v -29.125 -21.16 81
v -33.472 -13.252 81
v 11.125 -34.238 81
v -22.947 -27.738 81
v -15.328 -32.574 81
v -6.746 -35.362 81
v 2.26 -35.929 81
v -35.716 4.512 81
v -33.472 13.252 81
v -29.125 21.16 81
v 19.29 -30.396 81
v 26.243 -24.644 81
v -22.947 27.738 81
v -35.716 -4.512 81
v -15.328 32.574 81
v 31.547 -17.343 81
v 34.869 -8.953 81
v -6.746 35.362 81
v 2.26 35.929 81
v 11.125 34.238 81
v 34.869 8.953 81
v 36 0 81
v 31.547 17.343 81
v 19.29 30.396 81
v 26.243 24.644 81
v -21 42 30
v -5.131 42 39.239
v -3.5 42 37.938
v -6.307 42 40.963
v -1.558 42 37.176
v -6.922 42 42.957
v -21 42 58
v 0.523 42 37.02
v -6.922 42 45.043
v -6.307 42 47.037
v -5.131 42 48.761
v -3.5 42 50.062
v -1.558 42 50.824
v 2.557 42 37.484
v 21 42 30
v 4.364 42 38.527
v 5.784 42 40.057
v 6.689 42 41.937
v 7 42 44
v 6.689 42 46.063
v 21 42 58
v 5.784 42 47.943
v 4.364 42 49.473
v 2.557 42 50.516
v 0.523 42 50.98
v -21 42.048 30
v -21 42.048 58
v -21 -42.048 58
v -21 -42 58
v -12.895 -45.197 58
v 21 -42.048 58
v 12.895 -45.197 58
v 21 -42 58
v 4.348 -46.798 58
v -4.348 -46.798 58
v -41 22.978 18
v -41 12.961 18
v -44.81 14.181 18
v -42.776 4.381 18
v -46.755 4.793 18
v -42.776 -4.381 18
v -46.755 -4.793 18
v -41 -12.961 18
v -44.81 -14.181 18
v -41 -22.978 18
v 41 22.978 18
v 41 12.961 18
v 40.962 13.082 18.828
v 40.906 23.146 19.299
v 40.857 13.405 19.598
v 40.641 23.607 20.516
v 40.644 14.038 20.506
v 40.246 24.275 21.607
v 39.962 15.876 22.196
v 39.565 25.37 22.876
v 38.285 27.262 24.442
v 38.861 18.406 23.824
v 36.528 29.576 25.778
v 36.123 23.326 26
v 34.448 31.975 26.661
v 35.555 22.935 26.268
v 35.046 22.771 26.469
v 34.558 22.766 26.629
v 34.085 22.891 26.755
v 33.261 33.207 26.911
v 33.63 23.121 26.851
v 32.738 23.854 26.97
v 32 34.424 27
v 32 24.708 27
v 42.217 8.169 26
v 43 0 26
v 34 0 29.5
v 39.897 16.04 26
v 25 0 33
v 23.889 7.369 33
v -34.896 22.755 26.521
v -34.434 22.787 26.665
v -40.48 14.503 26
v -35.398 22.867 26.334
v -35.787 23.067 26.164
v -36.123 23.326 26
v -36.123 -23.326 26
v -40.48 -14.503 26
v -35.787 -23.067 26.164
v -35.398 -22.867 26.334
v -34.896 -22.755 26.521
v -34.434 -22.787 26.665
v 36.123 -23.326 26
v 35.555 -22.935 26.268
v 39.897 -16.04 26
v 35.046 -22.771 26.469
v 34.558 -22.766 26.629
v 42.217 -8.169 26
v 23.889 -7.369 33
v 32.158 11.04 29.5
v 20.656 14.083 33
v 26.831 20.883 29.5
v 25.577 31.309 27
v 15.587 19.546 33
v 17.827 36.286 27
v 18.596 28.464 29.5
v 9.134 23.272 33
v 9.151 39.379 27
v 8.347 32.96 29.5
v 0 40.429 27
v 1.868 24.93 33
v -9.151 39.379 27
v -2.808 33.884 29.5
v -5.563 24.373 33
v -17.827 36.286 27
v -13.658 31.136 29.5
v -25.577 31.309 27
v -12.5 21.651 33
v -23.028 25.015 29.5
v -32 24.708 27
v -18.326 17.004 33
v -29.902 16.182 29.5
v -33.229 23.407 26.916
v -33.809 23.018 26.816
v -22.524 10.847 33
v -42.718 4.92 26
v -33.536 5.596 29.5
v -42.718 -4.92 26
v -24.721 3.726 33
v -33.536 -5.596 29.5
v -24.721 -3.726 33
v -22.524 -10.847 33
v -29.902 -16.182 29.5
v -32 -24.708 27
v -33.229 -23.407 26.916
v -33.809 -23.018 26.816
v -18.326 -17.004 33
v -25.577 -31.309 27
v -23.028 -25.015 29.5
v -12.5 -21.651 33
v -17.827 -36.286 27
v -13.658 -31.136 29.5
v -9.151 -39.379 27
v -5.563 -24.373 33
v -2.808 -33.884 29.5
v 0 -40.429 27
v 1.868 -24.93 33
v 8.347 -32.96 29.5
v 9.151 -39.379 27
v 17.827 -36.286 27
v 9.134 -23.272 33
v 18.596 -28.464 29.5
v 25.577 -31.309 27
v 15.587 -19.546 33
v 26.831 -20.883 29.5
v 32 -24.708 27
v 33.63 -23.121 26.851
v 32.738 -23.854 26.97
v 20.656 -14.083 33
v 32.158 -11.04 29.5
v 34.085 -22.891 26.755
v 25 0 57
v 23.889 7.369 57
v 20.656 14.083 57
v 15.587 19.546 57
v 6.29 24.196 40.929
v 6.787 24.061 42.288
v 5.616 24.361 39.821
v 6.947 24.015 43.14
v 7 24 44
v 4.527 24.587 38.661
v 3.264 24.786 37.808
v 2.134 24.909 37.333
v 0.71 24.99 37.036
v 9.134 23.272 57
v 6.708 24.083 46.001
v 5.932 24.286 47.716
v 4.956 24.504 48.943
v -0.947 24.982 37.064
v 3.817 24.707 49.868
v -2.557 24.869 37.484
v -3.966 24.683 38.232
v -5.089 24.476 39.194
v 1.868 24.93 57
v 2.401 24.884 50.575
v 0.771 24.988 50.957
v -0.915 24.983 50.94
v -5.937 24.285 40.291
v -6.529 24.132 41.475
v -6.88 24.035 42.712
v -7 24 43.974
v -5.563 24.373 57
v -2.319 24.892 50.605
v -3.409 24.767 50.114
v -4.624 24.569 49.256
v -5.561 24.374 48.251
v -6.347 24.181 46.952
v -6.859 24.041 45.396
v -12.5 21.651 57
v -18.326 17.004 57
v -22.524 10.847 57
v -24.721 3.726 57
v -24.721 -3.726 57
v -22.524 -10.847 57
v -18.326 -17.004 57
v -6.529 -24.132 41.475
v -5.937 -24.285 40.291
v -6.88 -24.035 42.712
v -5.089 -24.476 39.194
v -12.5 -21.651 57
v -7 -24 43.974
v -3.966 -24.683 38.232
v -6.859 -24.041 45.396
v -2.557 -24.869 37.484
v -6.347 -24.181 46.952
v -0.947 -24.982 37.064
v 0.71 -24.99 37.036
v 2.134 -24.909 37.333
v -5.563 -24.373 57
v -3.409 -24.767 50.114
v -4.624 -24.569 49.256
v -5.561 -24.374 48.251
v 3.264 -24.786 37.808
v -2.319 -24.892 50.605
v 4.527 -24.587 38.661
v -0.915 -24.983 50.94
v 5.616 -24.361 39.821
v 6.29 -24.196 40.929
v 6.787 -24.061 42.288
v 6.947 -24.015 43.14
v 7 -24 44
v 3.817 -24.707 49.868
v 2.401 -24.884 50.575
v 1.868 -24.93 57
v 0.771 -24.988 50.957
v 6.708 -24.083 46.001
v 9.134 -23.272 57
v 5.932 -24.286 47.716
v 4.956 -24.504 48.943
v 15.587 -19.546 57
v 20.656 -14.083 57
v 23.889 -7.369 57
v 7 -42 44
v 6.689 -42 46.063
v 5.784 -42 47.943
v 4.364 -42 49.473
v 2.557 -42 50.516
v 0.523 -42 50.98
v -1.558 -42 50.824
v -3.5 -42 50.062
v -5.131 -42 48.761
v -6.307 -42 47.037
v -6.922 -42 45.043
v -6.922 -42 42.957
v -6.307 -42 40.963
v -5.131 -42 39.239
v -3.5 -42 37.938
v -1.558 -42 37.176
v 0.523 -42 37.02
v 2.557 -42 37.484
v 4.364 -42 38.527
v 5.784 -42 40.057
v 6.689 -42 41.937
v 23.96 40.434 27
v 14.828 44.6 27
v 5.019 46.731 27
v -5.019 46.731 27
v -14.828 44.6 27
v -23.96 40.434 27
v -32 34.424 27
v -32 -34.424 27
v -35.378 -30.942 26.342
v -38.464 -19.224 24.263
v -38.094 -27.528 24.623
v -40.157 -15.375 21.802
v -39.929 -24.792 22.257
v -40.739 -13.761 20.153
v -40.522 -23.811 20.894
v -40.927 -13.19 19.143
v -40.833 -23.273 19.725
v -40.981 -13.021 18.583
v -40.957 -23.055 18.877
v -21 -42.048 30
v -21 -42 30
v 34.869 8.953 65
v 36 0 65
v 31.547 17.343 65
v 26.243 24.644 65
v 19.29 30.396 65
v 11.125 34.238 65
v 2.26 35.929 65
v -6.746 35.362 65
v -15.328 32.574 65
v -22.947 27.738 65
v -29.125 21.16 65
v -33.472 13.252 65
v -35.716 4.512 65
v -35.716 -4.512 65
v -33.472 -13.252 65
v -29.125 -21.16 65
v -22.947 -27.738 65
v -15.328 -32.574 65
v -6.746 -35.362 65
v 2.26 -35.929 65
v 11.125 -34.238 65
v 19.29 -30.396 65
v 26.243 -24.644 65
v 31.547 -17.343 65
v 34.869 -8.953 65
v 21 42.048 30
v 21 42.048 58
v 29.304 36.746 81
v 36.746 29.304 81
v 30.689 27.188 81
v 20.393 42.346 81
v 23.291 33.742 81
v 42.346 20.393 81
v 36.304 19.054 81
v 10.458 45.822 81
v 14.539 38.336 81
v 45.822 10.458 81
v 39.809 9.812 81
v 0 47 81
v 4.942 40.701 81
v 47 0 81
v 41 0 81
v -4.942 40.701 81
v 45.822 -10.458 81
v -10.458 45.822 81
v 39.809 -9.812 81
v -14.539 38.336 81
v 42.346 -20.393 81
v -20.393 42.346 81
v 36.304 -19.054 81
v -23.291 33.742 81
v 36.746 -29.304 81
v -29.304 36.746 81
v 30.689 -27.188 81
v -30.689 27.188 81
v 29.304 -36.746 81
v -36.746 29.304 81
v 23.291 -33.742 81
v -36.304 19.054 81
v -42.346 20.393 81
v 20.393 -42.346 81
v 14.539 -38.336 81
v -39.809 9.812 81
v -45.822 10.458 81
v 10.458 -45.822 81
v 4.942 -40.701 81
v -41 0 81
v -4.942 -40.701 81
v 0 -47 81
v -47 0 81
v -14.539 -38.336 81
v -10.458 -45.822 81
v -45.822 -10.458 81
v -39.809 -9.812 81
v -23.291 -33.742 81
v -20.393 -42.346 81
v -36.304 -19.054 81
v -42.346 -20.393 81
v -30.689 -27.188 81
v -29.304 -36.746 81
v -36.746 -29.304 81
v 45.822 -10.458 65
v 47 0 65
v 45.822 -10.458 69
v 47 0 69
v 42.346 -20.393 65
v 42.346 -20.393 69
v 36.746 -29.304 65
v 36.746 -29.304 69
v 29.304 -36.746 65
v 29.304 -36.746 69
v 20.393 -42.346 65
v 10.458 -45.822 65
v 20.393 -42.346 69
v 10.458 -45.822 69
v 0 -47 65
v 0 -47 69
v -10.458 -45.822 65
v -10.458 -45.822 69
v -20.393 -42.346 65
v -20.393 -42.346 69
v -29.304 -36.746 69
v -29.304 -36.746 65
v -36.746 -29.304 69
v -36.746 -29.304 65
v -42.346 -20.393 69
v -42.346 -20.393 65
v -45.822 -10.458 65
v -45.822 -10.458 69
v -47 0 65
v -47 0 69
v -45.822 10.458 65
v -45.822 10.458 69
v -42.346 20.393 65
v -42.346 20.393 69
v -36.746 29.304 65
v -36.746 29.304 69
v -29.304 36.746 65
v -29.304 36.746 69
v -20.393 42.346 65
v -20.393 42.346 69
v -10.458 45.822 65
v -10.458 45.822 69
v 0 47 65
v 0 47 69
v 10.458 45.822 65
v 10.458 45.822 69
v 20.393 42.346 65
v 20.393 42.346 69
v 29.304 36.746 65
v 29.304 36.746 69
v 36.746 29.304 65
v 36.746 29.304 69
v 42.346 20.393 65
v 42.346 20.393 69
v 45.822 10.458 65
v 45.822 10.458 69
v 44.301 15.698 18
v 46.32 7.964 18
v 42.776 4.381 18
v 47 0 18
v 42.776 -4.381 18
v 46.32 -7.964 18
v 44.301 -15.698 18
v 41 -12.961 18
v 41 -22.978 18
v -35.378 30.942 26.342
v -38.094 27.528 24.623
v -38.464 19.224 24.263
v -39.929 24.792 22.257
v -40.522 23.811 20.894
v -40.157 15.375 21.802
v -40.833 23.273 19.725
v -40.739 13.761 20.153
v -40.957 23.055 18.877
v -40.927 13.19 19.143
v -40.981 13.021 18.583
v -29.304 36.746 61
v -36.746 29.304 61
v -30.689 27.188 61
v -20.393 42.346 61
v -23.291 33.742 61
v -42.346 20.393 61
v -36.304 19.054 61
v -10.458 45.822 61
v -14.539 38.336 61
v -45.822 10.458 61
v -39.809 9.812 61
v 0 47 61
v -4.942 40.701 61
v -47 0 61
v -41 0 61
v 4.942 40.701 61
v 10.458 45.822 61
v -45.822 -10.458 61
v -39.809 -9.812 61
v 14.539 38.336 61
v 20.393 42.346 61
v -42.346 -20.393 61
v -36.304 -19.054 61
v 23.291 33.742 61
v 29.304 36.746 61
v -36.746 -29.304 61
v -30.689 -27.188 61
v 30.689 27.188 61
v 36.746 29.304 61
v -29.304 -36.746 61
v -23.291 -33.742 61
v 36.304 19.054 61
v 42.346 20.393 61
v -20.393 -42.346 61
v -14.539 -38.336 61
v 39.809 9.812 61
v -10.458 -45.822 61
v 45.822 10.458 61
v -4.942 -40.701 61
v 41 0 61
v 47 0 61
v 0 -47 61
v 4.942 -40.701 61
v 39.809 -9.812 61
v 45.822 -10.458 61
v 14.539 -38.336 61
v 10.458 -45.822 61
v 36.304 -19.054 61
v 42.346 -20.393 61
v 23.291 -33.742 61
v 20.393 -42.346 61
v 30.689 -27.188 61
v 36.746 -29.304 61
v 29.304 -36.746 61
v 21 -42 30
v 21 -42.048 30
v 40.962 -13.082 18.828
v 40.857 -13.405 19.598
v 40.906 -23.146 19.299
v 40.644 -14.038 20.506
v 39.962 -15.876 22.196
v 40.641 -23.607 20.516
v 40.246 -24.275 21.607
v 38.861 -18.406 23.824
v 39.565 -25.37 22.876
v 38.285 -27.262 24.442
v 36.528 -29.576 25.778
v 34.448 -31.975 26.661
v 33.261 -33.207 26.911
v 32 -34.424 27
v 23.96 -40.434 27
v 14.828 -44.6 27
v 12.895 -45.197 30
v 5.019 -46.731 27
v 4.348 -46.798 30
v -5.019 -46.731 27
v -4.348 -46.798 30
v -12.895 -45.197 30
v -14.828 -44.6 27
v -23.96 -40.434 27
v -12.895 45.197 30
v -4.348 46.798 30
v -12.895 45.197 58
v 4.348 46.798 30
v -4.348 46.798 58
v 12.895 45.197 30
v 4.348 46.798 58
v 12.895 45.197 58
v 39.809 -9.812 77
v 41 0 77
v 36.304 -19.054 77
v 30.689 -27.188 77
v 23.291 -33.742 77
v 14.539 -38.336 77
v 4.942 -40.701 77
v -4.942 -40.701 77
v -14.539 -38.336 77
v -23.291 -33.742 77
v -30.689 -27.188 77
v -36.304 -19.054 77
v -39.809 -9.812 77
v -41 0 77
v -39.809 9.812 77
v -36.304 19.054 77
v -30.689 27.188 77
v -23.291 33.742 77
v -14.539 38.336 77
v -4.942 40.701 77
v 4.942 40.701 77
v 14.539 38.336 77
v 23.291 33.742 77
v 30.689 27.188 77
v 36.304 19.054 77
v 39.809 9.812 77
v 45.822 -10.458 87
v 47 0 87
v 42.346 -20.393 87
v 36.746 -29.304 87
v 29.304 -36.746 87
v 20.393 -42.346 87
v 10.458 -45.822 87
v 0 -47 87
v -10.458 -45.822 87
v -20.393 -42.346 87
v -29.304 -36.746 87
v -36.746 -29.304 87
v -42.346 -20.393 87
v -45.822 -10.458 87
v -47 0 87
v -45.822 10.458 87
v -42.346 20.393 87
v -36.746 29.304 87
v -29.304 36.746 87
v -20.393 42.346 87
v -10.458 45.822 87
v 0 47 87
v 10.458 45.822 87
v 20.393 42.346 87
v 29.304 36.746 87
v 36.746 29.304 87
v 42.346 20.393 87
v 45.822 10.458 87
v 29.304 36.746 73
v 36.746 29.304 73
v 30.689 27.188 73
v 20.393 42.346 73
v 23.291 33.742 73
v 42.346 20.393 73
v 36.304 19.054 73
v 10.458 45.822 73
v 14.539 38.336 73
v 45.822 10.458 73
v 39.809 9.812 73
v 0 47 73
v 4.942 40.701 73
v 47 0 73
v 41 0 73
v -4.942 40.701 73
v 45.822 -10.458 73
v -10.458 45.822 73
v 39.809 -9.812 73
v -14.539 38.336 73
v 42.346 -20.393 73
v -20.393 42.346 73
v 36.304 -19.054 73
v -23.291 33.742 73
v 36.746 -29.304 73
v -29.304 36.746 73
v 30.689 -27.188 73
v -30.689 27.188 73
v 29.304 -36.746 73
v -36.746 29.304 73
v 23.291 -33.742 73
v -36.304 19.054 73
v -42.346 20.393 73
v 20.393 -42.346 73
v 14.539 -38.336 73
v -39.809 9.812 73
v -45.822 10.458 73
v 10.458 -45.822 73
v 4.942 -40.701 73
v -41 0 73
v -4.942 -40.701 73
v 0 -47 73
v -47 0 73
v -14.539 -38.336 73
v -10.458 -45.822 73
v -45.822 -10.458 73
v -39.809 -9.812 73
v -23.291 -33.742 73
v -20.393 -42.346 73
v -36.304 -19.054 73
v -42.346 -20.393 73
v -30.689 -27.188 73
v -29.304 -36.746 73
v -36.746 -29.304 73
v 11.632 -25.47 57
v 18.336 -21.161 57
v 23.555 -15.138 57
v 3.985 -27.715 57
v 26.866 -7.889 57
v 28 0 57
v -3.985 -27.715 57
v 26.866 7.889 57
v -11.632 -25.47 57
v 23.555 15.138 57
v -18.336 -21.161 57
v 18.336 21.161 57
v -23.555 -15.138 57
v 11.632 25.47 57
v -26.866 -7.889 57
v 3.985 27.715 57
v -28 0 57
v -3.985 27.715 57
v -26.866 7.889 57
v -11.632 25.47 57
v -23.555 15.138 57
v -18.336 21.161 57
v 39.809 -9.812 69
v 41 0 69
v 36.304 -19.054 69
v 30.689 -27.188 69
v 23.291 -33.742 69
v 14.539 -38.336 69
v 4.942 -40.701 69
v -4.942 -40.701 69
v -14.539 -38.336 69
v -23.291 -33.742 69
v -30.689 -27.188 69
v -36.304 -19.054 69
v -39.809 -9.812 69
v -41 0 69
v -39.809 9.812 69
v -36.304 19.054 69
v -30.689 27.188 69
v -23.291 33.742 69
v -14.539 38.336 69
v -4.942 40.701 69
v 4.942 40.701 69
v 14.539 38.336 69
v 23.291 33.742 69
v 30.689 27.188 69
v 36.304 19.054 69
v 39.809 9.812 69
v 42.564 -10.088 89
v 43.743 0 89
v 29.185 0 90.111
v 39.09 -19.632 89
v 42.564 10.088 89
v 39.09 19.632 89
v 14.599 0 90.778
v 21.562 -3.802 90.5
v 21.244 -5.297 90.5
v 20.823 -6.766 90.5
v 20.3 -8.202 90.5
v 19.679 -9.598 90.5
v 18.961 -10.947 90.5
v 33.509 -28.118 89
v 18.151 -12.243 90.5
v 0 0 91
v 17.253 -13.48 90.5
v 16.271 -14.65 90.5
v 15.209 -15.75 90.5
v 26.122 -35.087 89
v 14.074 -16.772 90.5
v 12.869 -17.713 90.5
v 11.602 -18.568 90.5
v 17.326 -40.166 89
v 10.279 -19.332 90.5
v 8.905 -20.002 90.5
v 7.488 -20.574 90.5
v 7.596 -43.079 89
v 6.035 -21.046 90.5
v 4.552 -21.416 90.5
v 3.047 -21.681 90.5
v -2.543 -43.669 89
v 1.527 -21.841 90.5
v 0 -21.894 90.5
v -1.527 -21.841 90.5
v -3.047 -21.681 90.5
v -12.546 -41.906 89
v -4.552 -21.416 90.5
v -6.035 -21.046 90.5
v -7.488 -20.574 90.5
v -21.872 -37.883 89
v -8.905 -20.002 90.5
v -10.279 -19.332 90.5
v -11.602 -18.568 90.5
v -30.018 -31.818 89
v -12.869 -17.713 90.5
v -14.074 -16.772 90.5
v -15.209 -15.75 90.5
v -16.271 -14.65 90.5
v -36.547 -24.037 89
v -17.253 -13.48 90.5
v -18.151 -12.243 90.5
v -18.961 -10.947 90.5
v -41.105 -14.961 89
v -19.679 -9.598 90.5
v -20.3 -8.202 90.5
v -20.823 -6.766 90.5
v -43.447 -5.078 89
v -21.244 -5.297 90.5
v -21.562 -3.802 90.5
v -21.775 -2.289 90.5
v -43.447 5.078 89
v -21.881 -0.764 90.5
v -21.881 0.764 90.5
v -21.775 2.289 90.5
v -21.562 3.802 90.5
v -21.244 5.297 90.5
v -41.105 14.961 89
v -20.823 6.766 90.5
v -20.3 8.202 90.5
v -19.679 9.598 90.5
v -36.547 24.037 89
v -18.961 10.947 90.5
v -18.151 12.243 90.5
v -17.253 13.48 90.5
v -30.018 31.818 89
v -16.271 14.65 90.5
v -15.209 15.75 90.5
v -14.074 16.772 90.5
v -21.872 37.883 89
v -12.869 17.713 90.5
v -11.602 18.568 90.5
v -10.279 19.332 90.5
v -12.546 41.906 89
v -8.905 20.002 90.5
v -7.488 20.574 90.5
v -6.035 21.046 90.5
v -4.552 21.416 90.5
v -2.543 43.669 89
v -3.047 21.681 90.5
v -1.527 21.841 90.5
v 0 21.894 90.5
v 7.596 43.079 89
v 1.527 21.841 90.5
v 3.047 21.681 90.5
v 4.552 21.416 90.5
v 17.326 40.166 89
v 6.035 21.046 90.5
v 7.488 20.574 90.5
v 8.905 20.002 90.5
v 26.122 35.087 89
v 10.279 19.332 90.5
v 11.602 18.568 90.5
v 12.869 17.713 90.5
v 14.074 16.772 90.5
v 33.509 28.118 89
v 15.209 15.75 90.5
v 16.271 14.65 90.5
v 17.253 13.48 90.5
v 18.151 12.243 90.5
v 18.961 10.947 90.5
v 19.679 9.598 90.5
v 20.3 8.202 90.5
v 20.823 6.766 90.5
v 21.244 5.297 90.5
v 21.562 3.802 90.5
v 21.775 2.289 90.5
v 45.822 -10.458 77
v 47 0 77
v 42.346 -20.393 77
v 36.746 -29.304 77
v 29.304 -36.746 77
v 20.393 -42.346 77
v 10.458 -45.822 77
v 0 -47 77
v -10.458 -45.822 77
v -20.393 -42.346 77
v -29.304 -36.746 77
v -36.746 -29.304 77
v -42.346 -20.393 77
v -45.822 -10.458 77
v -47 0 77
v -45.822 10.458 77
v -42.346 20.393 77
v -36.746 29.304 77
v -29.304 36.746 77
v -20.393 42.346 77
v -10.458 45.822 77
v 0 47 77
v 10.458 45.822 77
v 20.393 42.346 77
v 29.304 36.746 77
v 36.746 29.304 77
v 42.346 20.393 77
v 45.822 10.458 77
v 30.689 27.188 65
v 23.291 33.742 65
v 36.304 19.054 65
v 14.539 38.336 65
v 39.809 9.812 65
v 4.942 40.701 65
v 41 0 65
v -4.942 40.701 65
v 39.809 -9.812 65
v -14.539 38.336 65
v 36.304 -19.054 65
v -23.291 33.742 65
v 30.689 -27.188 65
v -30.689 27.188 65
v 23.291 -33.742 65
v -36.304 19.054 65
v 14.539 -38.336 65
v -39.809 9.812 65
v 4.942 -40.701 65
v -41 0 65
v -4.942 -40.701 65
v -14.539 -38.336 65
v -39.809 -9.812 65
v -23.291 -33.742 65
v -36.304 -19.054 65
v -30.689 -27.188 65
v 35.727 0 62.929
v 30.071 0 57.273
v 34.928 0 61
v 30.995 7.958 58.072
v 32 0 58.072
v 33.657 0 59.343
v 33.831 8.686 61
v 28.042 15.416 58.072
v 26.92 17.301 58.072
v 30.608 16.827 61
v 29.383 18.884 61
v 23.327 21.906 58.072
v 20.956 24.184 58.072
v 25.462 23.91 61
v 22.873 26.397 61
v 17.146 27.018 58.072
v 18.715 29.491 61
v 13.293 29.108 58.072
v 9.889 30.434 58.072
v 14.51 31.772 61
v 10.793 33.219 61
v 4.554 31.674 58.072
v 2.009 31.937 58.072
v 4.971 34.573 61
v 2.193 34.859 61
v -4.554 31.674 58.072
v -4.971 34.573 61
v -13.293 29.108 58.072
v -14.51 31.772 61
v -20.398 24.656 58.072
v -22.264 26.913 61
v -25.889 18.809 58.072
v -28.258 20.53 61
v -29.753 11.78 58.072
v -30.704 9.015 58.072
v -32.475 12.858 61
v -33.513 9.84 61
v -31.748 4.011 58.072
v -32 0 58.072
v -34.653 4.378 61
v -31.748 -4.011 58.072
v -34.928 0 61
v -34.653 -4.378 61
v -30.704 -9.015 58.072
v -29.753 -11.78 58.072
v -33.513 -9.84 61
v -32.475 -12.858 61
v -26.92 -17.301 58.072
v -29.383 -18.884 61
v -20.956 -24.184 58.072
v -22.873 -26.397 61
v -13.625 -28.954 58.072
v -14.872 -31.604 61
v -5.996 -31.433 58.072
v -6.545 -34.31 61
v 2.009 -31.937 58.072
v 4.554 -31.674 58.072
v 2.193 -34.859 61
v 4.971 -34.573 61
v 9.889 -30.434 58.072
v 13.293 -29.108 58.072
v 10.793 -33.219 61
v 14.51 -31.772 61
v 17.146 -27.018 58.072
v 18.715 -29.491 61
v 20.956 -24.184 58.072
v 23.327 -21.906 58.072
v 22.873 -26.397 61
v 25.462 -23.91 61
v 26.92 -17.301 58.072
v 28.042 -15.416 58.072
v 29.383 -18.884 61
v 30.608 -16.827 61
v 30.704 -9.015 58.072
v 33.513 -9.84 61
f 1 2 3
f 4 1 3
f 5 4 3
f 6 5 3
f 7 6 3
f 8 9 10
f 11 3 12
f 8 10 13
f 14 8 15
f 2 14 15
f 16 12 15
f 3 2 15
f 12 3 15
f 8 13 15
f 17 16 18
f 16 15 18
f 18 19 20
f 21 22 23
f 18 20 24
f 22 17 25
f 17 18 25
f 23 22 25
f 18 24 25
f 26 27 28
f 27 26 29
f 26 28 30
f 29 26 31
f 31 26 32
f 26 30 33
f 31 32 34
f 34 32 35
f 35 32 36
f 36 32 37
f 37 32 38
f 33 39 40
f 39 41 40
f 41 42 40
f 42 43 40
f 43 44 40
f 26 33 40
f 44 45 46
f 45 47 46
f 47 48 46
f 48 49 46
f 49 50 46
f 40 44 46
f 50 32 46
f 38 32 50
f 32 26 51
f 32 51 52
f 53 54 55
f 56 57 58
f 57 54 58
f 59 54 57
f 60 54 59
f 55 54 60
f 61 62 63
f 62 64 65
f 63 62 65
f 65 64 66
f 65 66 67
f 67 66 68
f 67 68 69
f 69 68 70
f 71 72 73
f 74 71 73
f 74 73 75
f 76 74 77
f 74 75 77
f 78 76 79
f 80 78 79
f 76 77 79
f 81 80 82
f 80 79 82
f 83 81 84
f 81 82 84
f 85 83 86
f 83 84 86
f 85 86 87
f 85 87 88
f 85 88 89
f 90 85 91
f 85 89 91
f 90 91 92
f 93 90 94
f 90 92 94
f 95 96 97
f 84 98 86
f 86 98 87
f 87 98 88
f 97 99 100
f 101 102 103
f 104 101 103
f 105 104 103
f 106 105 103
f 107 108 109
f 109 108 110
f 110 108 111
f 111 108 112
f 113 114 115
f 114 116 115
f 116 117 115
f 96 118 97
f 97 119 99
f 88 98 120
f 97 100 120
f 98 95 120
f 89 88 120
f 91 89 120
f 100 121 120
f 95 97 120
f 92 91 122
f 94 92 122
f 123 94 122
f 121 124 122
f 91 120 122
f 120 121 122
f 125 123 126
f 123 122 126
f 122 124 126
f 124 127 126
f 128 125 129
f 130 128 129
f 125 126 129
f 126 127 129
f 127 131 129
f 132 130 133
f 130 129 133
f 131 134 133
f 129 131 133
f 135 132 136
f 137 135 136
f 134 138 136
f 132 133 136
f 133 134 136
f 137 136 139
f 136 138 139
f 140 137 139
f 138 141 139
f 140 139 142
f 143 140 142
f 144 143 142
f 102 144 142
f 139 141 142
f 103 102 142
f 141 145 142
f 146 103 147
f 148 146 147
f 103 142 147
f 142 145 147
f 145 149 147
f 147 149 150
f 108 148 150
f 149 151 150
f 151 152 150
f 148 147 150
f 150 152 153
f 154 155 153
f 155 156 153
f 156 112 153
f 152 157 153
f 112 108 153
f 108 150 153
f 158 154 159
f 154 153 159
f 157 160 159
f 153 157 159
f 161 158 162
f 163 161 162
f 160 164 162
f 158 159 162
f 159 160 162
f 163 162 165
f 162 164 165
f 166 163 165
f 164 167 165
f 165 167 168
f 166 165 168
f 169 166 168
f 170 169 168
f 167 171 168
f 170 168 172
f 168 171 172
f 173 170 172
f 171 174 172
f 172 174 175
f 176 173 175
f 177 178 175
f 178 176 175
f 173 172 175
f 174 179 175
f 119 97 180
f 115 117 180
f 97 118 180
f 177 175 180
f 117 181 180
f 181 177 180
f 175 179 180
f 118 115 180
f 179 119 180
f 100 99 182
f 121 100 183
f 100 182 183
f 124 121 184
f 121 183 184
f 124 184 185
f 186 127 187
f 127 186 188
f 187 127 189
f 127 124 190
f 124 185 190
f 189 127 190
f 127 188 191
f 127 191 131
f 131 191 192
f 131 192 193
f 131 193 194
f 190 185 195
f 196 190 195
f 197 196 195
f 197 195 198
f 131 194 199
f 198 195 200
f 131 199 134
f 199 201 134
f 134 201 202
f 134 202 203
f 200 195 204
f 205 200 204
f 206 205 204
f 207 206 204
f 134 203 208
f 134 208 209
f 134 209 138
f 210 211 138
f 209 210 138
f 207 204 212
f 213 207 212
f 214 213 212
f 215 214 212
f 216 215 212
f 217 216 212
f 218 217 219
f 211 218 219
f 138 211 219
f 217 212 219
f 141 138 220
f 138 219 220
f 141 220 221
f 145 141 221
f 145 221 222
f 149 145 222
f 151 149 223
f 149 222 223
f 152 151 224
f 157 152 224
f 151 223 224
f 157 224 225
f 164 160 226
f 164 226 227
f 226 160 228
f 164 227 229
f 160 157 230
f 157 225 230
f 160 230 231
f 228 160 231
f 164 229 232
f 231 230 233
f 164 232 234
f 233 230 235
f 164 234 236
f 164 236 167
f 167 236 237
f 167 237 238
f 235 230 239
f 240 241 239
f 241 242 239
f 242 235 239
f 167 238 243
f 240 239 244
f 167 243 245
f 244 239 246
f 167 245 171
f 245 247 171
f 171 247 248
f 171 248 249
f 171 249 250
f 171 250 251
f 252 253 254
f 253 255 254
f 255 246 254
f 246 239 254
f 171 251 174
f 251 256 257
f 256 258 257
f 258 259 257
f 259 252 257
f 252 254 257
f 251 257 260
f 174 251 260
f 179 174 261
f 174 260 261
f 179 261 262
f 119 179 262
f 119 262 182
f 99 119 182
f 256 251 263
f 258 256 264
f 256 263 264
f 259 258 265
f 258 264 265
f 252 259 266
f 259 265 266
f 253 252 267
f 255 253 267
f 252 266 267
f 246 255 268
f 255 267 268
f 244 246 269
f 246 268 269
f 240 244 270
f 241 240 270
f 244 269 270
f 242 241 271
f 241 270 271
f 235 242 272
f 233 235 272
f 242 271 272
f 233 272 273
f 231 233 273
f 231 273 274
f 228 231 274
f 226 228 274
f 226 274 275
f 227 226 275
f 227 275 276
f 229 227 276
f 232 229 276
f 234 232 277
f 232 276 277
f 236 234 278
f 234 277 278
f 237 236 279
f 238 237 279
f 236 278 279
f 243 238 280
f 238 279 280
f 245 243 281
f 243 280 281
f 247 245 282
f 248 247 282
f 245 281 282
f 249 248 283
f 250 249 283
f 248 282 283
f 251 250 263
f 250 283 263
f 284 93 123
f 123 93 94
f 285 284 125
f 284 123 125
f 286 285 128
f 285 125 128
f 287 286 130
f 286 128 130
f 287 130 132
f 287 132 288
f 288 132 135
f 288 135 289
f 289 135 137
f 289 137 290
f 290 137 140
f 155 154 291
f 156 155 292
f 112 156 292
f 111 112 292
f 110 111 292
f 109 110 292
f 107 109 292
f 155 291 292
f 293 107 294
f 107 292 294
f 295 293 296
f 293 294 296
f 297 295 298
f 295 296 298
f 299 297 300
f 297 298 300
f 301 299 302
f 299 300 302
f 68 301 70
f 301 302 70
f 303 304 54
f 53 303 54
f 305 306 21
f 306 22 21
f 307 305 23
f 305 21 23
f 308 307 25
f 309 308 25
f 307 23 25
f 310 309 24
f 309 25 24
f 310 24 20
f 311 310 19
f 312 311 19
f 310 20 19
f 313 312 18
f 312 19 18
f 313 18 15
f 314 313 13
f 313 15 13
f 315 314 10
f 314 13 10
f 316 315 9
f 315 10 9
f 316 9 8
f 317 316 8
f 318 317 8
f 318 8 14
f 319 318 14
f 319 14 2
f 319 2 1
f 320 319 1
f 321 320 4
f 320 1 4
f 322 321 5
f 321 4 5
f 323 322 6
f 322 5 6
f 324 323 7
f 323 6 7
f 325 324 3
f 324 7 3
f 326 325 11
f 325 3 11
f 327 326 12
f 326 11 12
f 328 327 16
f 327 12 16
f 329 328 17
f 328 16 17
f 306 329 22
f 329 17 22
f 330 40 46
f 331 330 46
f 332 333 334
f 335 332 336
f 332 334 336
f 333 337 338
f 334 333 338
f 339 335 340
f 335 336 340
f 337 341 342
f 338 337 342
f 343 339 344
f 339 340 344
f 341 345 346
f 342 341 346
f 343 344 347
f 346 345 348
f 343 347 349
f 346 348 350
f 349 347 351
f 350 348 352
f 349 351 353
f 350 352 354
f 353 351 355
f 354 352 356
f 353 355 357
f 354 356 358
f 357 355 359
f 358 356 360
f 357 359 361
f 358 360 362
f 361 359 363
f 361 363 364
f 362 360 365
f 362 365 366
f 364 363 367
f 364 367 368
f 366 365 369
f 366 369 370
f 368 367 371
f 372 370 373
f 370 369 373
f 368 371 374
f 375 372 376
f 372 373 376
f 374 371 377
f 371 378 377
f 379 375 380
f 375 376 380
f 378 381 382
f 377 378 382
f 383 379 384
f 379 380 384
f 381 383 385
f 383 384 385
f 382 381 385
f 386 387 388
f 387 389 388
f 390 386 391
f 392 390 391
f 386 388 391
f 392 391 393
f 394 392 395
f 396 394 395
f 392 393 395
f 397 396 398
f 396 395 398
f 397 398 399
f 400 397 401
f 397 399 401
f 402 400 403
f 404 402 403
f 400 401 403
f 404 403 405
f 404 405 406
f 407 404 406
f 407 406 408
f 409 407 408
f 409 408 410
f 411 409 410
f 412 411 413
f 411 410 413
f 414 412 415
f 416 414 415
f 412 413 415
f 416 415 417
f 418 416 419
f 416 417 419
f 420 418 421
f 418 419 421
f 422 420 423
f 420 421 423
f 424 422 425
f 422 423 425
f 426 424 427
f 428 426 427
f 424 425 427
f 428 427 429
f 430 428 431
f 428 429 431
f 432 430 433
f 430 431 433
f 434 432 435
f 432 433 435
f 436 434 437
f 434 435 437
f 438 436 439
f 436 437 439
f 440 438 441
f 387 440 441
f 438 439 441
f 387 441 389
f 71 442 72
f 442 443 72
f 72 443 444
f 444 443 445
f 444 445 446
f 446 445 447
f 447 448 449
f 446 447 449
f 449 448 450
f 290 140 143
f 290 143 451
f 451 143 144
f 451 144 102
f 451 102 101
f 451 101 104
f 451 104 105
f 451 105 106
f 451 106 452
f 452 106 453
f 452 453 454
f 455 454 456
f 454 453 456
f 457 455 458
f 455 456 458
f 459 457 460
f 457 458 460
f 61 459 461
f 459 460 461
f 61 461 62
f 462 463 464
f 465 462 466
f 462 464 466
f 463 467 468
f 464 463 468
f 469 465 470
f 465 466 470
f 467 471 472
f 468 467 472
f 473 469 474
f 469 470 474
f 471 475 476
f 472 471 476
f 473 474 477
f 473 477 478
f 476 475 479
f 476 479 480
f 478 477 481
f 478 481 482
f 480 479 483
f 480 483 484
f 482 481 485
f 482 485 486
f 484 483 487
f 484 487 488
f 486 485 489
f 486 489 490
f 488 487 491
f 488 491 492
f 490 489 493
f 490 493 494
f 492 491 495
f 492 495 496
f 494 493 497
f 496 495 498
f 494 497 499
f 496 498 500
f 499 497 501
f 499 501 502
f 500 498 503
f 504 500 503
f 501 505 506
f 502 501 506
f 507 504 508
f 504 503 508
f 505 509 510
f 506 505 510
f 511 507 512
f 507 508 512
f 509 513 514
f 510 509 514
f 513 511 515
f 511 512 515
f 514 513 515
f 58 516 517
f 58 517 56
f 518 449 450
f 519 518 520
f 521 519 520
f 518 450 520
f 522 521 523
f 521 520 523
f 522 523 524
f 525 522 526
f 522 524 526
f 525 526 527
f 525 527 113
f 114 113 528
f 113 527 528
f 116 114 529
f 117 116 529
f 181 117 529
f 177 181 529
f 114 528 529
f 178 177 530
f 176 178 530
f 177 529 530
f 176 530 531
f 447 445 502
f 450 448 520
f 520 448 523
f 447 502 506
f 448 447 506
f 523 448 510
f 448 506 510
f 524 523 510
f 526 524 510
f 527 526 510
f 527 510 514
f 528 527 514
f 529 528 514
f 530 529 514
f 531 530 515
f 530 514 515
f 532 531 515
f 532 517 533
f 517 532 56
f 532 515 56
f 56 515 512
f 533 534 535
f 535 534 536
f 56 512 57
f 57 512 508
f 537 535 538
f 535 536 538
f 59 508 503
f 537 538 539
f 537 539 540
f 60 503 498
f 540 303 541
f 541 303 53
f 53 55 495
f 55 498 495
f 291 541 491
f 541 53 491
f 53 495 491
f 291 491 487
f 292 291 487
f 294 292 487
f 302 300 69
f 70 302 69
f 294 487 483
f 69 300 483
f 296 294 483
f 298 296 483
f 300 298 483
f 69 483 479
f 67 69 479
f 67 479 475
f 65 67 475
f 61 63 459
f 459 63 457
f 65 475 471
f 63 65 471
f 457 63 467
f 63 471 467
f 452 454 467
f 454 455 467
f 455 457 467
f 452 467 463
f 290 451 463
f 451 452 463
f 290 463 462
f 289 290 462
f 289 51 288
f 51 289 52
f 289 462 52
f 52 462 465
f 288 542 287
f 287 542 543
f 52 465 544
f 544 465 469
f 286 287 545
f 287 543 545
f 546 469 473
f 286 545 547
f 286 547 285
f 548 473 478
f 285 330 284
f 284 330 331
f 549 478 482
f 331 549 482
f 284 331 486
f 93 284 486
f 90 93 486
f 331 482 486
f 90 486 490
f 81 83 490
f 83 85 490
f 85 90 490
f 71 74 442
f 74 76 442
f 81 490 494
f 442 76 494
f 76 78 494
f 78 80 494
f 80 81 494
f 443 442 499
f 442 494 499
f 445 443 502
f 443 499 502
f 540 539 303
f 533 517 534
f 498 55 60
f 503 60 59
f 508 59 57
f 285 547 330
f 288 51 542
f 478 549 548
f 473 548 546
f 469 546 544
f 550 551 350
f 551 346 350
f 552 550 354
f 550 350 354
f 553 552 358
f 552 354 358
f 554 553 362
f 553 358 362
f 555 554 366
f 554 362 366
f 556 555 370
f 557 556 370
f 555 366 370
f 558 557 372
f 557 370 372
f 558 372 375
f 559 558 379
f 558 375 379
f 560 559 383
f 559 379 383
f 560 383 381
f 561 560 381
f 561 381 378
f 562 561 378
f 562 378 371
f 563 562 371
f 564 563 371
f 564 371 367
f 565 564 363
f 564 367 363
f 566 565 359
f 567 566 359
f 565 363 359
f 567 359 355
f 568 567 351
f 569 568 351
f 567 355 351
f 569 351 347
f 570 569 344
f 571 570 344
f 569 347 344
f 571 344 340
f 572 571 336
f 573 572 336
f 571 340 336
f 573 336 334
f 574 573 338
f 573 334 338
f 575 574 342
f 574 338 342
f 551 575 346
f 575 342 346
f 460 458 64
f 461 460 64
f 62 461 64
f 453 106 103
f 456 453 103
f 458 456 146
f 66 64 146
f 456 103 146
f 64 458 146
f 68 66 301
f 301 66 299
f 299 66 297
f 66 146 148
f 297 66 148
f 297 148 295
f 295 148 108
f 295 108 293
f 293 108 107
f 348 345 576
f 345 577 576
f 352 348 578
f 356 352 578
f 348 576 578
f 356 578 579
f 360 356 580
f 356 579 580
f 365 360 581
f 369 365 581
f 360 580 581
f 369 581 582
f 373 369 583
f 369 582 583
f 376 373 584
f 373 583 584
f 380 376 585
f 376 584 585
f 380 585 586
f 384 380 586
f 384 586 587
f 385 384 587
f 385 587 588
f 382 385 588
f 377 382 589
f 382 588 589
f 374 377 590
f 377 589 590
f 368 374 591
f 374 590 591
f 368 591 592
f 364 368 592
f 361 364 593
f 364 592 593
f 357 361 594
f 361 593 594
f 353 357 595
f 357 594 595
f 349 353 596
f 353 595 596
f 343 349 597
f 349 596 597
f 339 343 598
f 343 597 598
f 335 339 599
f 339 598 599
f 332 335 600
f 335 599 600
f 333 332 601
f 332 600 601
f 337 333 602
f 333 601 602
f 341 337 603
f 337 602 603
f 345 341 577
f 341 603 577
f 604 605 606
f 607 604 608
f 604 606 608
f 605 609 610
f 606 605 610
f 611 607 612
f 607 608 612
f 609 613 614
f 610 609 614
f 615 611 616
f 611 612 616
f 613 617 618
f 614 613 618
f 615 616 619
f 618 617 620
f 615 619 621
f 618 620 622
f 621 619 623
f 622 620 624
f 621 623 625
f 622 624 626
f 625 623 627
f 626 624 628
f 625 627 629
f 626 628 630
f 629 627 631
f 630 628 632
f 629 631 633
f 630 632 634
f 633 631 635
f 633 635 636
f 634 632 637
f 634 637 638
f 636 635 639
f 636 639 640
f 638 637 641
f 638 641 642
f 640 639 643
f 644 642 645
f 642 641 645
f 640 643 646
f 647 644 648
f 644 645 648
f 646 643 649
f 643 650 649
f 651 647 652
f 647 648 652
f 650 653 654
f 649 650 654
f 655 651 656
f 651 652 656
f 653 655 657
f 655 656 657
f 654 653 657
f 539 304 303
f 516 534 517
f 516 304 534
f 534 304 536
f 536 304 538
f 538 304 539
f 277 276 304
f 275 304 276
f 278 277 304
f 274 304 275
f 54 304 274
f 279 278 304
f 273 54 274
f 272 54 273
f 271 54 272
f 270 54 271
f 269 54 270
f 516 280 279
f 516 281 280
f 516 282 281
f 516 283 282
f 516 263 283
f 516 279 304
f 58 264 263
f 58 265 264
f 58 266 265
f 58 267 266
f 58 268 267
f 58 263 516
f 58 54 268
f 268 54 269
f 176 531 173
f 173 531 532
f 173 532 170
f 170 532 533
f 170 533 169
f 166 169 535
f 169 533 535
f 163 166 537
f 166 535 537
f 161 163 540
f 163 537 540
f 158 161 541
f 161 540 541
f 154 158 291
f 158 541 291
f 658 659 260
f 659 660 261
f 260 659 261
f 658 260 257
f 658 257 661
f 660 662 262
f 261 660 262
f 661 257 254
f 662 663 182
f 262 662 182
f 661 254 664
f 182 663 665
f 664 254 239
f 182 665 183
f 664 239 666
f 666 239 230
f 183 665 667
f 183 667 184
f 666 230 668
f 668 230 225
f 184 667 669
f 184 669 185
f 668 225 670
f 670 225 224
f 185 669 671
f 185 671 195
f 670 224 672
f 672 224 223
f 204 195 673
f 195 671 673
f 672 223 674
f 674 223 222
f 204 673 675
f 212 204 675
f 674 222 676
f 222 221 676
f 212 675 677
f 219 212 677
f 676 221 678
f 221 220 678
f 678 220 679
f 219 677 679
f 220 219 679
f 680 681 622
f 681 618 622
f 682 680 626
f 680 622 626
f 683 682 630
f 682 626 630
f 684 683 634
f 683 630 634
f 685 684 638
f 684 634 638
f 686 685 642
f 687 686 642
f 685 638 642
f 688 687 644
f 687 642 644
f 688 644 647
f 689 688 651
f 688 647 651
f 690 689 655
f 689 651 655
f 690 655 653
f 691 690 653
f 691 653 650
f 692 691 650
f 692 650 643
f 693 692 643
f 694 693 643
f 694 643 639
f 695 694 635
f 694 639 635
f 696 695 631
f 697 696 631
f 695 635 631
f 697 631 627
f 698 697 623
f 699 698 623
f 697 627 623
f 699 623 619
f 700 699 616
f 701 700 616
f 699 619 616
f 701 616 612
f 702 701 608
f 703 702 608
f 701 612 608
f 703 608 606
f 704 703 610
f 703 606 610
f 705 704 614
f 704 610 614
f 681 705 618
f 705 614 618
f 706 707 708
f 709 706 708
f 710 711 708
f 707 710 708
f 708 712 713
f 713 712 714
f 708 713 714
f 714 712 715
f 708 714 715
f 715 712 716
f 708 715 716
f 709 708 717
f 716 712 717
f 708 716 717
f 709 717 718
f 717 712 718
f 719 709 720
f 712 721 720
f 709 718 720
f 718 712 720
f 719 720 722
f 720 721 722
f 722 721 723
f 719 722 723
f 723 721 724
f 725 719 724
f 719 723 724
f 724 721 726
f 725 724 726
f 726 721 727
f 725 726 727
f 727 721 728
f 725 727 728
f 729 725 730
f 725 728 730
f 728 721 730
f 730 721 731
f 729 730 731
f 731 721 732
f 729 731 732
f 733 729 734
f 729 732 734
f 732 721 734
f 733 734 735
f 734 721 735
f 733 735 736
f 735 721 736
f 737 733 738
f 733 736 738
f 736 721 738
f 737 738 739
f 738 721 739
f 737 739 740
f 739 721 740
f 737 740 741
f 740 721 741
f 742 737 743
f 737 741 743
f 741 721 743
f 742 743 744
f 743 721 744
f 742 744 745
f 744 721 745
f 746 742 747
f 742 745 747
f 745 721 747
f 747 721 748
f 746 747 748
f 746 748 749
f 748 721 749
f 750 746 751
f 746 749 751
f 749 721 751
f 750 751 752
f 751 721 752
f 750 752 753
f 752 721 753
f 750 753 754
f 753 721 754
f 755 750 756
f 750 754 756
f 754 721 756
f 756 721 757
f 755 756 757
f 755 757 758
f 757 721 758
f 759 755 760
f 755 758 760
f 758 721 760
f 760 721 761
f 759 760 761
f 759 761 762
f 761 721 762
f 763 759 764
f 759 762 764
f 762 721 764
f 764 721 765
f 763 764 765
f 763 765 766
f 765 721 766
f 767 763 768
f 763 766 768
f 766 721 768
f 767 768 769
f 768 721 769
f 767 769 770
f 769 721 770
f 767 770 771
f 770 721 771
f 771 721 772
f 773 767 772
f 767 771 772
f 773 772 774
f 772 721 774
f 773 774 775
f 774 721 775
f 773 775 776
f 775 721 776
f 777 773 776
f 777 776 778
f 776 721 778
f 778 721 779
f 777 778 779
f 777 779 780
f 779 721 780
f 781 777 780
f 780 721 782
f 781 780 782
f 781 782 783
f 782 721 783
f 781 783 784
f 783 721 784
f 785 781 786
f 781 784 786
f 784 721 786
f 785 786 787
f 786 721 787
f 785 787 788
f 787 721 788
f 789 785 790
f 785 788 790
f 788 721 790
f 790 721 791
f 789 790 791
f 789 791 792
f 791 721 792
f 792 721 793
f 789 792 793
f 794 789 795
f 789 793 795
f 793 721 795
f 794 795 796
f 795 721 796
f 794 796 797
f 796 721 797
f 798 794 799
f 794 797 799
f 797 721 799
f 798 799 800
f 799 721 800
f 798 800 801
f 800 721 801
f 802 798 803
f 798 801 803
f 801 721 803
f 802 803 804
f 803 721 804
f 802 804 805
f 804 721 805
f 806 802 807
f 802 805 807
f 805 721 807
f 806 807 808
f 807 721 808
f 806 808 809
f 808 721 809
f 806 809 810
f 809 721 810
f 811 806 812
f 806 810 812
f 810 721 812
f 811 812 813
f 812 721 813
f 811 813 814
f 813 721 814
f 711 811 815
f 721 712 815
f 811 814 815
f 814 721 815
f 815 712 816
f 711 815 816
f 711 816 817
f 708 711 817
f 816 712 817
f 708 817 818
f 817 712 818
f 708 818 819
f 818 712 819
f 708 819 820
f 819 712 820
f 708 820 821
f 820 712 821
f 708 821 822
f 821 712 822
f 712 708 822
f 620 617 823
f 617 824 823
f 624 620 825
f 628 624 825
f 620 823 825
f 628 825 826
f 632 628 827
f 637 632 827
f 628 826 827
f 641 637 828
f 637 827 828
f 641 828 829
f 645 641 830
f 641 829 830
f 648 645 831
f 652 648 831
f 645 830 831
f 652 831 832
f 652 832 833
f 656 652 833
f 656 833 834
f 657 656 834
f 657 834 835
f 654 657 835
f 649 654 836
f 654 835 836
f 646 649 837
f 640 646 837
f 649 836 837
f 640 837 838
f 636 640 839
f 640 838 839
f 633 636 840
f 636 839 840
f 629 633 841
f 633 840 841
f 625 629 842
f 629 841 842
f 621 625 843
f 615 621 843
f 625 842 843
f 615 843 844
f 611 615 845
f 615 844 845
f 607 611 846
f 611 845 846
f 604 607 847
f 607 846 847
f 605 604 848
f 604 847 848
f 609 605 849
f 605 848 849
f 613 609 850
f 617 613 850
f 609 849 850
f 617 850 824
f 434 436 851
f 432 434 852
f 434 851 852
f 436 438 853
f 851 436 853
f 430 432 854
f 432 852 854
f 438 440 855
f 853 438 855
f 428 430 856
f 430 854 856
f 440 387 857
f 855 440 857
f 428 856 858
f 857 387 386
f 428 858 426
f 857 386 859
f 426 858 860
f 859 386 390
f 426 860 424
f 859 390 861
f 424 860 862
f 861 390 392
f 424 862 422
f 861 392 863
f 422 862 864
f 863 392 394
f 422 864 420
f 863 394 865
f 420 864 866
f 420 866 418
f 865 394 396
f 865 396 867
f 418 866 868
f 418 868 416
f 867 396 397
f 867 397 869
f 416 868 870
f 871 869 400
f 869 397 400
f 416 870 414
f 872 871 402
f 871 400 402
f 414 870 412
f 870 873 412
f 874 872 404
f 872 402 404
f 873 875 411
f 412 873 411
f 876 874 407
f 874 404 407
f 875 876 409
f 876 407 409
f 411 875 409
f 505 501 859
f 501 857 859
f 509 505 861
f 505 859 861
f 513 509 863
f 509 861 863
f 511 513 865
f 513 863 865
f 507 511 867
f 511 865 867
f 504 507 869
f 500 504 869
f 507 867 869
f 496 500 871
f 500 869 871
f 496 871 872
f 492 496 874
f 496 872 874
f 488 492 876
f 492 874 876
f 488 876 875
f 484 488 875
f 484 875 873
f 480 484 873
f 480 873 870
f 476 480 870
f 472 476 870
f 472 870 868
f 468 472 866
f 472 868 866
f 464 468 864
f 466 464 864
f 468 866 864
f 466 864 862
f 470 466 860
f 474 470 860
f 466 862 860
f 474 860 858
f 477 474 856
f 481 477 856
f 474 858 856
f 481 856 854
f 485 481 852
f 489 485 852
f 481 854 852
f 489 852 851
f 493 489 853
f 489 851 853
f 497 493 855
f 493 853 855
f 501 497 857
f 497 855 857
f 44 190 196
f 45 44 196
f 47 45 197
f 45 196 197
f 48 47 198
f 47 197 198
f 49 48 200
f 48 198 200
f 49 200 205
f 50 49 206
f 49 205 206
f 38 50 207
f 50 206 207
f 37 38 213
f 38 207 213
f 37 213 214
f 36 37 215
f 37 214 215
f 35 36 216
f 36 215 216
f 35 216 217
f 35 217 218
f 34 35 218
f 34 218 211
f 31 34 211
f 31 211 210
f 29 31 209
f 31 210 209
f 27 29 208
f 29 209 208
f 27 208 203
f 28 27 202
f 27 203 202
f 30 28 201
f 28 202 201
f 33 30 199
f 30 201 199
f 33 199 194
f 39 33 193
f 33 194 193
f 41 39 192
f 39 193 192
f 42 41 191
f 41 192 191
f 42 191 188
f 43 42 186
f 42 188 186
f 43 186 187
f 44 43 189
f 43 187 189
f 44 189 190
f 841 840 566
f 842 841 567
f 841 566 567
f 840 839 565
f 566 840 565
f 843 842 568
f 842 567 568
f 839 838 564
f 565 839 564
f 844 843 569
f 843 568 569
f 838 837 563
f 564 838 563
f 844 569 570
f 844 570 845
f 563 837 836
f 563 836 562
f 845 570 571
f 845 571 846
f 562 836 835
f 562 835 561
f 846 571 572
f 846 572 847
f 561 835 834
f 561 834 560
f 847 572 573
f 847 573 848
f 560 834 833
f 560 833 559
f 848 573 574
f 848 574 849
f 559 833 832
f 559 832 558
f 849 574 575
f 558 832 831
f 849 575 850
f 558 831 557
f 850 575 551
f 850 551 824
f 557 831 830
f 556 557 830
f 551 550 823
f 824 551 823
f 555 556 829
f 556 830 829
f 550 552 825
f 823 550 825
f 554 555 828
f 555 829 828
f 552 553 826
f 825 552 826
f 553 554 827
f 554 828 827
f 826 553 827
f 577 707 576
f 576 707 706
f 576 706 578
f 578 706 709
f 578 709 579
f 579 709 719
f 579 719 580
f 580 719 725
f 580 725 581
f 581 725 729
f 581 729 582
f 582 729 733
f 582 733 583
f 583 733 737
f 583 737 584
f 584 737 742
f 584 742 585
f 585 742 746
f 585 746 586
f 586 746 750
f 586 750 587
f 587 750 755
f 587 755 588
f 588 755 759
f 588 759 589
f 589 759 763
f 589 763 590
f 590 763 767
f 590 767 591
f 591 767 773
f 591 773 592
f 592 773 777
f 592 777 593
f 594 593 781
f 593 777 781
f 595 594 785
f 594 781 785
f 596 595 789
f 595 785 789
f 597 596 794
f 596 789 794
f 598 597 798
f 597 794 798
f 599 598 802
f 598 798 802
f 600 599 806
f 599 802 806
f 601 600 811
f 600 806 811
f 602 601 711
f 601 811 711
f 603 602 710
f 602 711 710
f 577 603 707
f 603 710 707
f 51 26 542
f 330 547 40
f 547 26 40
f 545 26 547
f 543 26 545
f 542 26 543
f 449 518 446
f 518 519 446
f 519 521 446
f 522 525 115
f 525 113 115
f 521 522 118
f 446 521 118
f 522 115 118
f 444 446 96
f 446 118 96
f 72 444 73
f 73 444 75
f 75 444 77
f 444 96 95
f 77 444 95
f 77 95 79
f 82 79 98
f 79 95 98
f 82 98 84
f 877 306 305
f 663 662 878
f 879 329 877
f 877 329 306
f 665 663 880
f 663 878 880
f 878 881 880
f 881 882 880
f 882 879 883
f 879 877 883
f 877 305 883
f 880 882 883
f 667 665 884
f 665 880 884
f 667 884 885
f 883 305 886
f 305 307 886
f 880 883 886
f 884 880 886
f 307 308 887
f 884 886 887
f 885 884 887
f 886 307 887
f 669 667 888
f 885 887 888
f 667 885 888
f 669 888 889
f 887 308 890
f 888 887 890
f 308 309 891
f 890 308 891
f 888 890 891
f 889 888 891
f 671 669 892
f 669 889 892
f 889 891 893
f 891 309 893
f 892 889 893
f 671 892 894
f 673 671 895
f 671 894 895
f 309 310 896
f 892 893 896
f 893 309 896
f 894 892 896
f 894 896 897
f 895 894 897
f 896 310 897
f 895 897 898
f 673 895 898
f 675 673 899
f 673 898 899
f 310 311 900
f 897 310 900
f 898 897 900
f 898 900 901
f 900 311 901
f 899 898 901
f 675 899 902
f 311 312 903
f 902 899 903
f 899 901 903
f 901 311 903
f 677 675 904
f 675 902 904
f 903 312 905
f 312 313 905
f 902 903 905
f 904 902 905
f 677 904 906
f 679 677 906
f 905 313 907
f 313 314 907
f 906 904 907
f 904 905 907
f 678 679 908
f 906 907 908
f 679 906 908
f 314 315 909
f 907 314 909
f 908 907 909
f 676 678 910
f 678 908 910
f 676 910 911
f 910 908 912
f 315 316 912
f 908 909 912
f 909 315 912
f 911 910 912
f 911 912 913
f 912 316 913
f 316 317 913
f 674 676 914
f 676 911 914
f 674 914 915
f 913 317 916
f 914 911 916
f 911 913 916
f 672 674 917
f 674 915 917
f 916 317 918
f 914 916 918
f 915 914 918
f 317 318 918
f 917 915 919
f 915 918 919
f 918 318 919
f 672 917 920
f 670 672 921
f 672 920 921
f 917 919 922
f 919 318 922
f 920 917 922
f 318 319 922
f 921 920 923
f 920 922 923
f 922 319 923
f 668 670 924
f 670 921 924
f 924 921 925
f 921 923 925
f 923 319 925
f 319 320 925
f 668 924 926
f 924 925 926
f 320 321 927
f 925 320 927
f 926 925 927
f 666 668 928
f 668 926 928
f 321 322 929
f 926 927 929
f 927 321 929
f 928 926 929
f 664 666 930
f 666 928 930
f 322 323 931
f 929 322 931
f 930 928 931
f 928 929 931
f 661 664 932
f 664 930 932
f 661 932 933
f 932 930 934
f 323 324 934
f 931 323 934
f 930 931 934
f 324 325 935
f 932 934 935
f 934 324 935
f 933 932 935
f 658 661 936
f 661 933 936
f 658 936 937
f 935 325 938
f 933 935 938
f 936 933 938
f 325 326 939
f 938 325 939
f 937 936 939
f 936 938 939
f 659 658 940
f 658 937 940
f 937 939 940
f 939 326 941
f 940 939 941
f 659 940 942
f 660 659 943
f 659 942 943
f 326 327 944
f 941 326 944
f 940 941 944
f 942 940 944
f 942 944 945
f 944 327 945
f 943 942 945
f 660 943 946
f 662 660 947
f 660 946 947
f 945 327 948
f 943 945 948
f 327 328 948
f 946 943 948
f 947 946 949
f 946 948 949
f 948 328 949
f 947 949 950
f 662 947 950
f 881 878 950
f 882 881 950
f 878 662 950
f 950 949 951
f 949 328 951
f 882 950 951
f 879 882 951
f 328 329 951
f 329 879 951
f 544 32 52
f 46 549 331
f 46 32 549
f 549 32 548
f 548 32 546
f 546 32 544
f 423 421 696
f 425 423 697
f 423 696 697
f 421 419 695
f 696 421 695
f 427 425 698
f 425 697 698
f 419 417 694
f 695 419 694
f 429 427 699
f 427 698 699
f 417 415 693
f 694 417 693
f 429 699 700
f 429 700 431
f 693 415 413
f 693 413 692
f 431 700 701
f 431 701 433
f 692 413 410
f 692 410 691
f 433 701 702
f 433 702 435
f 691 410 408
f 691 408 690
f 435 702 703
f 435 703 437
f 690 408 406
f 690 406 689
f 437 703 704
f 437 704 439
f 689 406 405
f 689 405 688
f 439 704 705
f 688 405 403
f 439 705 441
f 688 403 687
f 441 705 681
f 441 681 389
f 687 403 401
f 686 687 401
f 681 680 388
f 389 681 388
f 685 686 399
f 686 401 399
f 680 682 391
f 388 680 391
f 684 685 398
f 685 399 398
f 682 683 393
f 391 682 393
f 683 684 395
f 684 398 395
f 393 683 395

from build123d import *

# Parameters (mm, degrees)
F2_R     = 7
F3_DEPTH = 72
F5_START = 42
F4_W     = 42
F4_H     = 28
F4_R     = 7
F5_DEPTH = 28.7
F9_DEPTH = 211.3


# Not quite as in the source:
# - a pattern or mirror of a feature is missing from the dataset's text; its kind, count and spacing are read off the source's solid


with BuildPart() as f1:
    # F0 (on Front) → F1 (revolve)
    with BuildSketch(Plane.XZ):
        with BuildLine():
            Line((47, 87), (43.7432713807, 89))
            ThreePointArc((43.7432713807, 89), (21.8944844144, 90.4997389679), (0, 91))
            Line((0, 91), (0, 18))
            Line((0, 18), (47, 18))
            Line((47, 18), (47, 33))
            Line((47, 33), (47, 57))
            Line((47, 57), (47, 61))
            Line((47, 61), (41, 61))
            Line((41, 61), (41, 65))
            Line((41, 65), (47, 65))
            Line((47, 65), (47, 69))
            Line((47, 69), (41, 69))
            Line((41, 69), (41, 73))
            Line((41, 73), (47, 73))
            Line((47, 73), (47, 77))
            Line((47, 77), (41, 77))
            Line((41, 77), (41, 81))
            Line((41, 81), (47, 81))
            Line((47, 81), (47, 87))
        make_face()
    revolve(axis=Axis((0, 0, 45.5), (0, 0, -1)))

    # F2 (on Front) → F3 (cut, symmetric)
    with BuildSketch(Plane.XZ):
        with Locations((0, 44)):
            Circle(F2_R)
    extrude(amount=F3_DEPTH, both=True, mode=Mode.SUBTRACT)

    # F4 (on Front) → F5 (cut)
    with BuildSketch(Plane.XZ.offset(F5_START)):
        with Locations((0, 44)):
            Rectangle(F4_W, F4_H)
        with Locations((0, 44)):
            Circle(F4_R, mode=Mode.SUBTRACT)
    f5 = extrude(amount=F5_DEPTH, mode=Mode.SUBTRACT)

    # F5_copies: F5 across plane
    add(f5.mirror(Plane.ZX), mode=Mode.SUBTRACT)

    # F6 (on Front) → F7 (revolve, cut)
    with BuildSketch(Plane.XZ):
        with BuildLine():
            Line((0, 81), (0, 18))
            Line((0, 18), (43, 18))
            Line((43, 18), (43, 26))
            Line((43, 26), (25, 33))
            Line((25, 33), (25, 57))
            Line((25, 57), (28, 57))
            ThreePointArc((28, 57), (33.6568542495, 59.3431457505), (36, 65))
            Line((36, 65), (36, 81))
            Line((36, 81), (0, 81))
        make_face()
    revolve(axis=Axis((0, 0, 34.176344052), (0, 0, 1)), mode=Mode.SUBTRACT)

    # F8 (on Front) → F9 (cut, symmetric)
    with BuildSketch(Plane.XZ):
        with BuildLine():
            Line((32, 27), (-32, 27))
            ThreePointArc((-32, 27), (-38.3639610307, 24.3639610307), (-41, 18))
            Line((-41, 18), (41, 18))
            ThreePointArc((41, 18), (38.3639610307, 24.3639610307), (32, 27))
        make_face()
    extrude(amount=F9_DEPTH, both=True, mode=Mode.SUBTRACT)


solid = f1.part
